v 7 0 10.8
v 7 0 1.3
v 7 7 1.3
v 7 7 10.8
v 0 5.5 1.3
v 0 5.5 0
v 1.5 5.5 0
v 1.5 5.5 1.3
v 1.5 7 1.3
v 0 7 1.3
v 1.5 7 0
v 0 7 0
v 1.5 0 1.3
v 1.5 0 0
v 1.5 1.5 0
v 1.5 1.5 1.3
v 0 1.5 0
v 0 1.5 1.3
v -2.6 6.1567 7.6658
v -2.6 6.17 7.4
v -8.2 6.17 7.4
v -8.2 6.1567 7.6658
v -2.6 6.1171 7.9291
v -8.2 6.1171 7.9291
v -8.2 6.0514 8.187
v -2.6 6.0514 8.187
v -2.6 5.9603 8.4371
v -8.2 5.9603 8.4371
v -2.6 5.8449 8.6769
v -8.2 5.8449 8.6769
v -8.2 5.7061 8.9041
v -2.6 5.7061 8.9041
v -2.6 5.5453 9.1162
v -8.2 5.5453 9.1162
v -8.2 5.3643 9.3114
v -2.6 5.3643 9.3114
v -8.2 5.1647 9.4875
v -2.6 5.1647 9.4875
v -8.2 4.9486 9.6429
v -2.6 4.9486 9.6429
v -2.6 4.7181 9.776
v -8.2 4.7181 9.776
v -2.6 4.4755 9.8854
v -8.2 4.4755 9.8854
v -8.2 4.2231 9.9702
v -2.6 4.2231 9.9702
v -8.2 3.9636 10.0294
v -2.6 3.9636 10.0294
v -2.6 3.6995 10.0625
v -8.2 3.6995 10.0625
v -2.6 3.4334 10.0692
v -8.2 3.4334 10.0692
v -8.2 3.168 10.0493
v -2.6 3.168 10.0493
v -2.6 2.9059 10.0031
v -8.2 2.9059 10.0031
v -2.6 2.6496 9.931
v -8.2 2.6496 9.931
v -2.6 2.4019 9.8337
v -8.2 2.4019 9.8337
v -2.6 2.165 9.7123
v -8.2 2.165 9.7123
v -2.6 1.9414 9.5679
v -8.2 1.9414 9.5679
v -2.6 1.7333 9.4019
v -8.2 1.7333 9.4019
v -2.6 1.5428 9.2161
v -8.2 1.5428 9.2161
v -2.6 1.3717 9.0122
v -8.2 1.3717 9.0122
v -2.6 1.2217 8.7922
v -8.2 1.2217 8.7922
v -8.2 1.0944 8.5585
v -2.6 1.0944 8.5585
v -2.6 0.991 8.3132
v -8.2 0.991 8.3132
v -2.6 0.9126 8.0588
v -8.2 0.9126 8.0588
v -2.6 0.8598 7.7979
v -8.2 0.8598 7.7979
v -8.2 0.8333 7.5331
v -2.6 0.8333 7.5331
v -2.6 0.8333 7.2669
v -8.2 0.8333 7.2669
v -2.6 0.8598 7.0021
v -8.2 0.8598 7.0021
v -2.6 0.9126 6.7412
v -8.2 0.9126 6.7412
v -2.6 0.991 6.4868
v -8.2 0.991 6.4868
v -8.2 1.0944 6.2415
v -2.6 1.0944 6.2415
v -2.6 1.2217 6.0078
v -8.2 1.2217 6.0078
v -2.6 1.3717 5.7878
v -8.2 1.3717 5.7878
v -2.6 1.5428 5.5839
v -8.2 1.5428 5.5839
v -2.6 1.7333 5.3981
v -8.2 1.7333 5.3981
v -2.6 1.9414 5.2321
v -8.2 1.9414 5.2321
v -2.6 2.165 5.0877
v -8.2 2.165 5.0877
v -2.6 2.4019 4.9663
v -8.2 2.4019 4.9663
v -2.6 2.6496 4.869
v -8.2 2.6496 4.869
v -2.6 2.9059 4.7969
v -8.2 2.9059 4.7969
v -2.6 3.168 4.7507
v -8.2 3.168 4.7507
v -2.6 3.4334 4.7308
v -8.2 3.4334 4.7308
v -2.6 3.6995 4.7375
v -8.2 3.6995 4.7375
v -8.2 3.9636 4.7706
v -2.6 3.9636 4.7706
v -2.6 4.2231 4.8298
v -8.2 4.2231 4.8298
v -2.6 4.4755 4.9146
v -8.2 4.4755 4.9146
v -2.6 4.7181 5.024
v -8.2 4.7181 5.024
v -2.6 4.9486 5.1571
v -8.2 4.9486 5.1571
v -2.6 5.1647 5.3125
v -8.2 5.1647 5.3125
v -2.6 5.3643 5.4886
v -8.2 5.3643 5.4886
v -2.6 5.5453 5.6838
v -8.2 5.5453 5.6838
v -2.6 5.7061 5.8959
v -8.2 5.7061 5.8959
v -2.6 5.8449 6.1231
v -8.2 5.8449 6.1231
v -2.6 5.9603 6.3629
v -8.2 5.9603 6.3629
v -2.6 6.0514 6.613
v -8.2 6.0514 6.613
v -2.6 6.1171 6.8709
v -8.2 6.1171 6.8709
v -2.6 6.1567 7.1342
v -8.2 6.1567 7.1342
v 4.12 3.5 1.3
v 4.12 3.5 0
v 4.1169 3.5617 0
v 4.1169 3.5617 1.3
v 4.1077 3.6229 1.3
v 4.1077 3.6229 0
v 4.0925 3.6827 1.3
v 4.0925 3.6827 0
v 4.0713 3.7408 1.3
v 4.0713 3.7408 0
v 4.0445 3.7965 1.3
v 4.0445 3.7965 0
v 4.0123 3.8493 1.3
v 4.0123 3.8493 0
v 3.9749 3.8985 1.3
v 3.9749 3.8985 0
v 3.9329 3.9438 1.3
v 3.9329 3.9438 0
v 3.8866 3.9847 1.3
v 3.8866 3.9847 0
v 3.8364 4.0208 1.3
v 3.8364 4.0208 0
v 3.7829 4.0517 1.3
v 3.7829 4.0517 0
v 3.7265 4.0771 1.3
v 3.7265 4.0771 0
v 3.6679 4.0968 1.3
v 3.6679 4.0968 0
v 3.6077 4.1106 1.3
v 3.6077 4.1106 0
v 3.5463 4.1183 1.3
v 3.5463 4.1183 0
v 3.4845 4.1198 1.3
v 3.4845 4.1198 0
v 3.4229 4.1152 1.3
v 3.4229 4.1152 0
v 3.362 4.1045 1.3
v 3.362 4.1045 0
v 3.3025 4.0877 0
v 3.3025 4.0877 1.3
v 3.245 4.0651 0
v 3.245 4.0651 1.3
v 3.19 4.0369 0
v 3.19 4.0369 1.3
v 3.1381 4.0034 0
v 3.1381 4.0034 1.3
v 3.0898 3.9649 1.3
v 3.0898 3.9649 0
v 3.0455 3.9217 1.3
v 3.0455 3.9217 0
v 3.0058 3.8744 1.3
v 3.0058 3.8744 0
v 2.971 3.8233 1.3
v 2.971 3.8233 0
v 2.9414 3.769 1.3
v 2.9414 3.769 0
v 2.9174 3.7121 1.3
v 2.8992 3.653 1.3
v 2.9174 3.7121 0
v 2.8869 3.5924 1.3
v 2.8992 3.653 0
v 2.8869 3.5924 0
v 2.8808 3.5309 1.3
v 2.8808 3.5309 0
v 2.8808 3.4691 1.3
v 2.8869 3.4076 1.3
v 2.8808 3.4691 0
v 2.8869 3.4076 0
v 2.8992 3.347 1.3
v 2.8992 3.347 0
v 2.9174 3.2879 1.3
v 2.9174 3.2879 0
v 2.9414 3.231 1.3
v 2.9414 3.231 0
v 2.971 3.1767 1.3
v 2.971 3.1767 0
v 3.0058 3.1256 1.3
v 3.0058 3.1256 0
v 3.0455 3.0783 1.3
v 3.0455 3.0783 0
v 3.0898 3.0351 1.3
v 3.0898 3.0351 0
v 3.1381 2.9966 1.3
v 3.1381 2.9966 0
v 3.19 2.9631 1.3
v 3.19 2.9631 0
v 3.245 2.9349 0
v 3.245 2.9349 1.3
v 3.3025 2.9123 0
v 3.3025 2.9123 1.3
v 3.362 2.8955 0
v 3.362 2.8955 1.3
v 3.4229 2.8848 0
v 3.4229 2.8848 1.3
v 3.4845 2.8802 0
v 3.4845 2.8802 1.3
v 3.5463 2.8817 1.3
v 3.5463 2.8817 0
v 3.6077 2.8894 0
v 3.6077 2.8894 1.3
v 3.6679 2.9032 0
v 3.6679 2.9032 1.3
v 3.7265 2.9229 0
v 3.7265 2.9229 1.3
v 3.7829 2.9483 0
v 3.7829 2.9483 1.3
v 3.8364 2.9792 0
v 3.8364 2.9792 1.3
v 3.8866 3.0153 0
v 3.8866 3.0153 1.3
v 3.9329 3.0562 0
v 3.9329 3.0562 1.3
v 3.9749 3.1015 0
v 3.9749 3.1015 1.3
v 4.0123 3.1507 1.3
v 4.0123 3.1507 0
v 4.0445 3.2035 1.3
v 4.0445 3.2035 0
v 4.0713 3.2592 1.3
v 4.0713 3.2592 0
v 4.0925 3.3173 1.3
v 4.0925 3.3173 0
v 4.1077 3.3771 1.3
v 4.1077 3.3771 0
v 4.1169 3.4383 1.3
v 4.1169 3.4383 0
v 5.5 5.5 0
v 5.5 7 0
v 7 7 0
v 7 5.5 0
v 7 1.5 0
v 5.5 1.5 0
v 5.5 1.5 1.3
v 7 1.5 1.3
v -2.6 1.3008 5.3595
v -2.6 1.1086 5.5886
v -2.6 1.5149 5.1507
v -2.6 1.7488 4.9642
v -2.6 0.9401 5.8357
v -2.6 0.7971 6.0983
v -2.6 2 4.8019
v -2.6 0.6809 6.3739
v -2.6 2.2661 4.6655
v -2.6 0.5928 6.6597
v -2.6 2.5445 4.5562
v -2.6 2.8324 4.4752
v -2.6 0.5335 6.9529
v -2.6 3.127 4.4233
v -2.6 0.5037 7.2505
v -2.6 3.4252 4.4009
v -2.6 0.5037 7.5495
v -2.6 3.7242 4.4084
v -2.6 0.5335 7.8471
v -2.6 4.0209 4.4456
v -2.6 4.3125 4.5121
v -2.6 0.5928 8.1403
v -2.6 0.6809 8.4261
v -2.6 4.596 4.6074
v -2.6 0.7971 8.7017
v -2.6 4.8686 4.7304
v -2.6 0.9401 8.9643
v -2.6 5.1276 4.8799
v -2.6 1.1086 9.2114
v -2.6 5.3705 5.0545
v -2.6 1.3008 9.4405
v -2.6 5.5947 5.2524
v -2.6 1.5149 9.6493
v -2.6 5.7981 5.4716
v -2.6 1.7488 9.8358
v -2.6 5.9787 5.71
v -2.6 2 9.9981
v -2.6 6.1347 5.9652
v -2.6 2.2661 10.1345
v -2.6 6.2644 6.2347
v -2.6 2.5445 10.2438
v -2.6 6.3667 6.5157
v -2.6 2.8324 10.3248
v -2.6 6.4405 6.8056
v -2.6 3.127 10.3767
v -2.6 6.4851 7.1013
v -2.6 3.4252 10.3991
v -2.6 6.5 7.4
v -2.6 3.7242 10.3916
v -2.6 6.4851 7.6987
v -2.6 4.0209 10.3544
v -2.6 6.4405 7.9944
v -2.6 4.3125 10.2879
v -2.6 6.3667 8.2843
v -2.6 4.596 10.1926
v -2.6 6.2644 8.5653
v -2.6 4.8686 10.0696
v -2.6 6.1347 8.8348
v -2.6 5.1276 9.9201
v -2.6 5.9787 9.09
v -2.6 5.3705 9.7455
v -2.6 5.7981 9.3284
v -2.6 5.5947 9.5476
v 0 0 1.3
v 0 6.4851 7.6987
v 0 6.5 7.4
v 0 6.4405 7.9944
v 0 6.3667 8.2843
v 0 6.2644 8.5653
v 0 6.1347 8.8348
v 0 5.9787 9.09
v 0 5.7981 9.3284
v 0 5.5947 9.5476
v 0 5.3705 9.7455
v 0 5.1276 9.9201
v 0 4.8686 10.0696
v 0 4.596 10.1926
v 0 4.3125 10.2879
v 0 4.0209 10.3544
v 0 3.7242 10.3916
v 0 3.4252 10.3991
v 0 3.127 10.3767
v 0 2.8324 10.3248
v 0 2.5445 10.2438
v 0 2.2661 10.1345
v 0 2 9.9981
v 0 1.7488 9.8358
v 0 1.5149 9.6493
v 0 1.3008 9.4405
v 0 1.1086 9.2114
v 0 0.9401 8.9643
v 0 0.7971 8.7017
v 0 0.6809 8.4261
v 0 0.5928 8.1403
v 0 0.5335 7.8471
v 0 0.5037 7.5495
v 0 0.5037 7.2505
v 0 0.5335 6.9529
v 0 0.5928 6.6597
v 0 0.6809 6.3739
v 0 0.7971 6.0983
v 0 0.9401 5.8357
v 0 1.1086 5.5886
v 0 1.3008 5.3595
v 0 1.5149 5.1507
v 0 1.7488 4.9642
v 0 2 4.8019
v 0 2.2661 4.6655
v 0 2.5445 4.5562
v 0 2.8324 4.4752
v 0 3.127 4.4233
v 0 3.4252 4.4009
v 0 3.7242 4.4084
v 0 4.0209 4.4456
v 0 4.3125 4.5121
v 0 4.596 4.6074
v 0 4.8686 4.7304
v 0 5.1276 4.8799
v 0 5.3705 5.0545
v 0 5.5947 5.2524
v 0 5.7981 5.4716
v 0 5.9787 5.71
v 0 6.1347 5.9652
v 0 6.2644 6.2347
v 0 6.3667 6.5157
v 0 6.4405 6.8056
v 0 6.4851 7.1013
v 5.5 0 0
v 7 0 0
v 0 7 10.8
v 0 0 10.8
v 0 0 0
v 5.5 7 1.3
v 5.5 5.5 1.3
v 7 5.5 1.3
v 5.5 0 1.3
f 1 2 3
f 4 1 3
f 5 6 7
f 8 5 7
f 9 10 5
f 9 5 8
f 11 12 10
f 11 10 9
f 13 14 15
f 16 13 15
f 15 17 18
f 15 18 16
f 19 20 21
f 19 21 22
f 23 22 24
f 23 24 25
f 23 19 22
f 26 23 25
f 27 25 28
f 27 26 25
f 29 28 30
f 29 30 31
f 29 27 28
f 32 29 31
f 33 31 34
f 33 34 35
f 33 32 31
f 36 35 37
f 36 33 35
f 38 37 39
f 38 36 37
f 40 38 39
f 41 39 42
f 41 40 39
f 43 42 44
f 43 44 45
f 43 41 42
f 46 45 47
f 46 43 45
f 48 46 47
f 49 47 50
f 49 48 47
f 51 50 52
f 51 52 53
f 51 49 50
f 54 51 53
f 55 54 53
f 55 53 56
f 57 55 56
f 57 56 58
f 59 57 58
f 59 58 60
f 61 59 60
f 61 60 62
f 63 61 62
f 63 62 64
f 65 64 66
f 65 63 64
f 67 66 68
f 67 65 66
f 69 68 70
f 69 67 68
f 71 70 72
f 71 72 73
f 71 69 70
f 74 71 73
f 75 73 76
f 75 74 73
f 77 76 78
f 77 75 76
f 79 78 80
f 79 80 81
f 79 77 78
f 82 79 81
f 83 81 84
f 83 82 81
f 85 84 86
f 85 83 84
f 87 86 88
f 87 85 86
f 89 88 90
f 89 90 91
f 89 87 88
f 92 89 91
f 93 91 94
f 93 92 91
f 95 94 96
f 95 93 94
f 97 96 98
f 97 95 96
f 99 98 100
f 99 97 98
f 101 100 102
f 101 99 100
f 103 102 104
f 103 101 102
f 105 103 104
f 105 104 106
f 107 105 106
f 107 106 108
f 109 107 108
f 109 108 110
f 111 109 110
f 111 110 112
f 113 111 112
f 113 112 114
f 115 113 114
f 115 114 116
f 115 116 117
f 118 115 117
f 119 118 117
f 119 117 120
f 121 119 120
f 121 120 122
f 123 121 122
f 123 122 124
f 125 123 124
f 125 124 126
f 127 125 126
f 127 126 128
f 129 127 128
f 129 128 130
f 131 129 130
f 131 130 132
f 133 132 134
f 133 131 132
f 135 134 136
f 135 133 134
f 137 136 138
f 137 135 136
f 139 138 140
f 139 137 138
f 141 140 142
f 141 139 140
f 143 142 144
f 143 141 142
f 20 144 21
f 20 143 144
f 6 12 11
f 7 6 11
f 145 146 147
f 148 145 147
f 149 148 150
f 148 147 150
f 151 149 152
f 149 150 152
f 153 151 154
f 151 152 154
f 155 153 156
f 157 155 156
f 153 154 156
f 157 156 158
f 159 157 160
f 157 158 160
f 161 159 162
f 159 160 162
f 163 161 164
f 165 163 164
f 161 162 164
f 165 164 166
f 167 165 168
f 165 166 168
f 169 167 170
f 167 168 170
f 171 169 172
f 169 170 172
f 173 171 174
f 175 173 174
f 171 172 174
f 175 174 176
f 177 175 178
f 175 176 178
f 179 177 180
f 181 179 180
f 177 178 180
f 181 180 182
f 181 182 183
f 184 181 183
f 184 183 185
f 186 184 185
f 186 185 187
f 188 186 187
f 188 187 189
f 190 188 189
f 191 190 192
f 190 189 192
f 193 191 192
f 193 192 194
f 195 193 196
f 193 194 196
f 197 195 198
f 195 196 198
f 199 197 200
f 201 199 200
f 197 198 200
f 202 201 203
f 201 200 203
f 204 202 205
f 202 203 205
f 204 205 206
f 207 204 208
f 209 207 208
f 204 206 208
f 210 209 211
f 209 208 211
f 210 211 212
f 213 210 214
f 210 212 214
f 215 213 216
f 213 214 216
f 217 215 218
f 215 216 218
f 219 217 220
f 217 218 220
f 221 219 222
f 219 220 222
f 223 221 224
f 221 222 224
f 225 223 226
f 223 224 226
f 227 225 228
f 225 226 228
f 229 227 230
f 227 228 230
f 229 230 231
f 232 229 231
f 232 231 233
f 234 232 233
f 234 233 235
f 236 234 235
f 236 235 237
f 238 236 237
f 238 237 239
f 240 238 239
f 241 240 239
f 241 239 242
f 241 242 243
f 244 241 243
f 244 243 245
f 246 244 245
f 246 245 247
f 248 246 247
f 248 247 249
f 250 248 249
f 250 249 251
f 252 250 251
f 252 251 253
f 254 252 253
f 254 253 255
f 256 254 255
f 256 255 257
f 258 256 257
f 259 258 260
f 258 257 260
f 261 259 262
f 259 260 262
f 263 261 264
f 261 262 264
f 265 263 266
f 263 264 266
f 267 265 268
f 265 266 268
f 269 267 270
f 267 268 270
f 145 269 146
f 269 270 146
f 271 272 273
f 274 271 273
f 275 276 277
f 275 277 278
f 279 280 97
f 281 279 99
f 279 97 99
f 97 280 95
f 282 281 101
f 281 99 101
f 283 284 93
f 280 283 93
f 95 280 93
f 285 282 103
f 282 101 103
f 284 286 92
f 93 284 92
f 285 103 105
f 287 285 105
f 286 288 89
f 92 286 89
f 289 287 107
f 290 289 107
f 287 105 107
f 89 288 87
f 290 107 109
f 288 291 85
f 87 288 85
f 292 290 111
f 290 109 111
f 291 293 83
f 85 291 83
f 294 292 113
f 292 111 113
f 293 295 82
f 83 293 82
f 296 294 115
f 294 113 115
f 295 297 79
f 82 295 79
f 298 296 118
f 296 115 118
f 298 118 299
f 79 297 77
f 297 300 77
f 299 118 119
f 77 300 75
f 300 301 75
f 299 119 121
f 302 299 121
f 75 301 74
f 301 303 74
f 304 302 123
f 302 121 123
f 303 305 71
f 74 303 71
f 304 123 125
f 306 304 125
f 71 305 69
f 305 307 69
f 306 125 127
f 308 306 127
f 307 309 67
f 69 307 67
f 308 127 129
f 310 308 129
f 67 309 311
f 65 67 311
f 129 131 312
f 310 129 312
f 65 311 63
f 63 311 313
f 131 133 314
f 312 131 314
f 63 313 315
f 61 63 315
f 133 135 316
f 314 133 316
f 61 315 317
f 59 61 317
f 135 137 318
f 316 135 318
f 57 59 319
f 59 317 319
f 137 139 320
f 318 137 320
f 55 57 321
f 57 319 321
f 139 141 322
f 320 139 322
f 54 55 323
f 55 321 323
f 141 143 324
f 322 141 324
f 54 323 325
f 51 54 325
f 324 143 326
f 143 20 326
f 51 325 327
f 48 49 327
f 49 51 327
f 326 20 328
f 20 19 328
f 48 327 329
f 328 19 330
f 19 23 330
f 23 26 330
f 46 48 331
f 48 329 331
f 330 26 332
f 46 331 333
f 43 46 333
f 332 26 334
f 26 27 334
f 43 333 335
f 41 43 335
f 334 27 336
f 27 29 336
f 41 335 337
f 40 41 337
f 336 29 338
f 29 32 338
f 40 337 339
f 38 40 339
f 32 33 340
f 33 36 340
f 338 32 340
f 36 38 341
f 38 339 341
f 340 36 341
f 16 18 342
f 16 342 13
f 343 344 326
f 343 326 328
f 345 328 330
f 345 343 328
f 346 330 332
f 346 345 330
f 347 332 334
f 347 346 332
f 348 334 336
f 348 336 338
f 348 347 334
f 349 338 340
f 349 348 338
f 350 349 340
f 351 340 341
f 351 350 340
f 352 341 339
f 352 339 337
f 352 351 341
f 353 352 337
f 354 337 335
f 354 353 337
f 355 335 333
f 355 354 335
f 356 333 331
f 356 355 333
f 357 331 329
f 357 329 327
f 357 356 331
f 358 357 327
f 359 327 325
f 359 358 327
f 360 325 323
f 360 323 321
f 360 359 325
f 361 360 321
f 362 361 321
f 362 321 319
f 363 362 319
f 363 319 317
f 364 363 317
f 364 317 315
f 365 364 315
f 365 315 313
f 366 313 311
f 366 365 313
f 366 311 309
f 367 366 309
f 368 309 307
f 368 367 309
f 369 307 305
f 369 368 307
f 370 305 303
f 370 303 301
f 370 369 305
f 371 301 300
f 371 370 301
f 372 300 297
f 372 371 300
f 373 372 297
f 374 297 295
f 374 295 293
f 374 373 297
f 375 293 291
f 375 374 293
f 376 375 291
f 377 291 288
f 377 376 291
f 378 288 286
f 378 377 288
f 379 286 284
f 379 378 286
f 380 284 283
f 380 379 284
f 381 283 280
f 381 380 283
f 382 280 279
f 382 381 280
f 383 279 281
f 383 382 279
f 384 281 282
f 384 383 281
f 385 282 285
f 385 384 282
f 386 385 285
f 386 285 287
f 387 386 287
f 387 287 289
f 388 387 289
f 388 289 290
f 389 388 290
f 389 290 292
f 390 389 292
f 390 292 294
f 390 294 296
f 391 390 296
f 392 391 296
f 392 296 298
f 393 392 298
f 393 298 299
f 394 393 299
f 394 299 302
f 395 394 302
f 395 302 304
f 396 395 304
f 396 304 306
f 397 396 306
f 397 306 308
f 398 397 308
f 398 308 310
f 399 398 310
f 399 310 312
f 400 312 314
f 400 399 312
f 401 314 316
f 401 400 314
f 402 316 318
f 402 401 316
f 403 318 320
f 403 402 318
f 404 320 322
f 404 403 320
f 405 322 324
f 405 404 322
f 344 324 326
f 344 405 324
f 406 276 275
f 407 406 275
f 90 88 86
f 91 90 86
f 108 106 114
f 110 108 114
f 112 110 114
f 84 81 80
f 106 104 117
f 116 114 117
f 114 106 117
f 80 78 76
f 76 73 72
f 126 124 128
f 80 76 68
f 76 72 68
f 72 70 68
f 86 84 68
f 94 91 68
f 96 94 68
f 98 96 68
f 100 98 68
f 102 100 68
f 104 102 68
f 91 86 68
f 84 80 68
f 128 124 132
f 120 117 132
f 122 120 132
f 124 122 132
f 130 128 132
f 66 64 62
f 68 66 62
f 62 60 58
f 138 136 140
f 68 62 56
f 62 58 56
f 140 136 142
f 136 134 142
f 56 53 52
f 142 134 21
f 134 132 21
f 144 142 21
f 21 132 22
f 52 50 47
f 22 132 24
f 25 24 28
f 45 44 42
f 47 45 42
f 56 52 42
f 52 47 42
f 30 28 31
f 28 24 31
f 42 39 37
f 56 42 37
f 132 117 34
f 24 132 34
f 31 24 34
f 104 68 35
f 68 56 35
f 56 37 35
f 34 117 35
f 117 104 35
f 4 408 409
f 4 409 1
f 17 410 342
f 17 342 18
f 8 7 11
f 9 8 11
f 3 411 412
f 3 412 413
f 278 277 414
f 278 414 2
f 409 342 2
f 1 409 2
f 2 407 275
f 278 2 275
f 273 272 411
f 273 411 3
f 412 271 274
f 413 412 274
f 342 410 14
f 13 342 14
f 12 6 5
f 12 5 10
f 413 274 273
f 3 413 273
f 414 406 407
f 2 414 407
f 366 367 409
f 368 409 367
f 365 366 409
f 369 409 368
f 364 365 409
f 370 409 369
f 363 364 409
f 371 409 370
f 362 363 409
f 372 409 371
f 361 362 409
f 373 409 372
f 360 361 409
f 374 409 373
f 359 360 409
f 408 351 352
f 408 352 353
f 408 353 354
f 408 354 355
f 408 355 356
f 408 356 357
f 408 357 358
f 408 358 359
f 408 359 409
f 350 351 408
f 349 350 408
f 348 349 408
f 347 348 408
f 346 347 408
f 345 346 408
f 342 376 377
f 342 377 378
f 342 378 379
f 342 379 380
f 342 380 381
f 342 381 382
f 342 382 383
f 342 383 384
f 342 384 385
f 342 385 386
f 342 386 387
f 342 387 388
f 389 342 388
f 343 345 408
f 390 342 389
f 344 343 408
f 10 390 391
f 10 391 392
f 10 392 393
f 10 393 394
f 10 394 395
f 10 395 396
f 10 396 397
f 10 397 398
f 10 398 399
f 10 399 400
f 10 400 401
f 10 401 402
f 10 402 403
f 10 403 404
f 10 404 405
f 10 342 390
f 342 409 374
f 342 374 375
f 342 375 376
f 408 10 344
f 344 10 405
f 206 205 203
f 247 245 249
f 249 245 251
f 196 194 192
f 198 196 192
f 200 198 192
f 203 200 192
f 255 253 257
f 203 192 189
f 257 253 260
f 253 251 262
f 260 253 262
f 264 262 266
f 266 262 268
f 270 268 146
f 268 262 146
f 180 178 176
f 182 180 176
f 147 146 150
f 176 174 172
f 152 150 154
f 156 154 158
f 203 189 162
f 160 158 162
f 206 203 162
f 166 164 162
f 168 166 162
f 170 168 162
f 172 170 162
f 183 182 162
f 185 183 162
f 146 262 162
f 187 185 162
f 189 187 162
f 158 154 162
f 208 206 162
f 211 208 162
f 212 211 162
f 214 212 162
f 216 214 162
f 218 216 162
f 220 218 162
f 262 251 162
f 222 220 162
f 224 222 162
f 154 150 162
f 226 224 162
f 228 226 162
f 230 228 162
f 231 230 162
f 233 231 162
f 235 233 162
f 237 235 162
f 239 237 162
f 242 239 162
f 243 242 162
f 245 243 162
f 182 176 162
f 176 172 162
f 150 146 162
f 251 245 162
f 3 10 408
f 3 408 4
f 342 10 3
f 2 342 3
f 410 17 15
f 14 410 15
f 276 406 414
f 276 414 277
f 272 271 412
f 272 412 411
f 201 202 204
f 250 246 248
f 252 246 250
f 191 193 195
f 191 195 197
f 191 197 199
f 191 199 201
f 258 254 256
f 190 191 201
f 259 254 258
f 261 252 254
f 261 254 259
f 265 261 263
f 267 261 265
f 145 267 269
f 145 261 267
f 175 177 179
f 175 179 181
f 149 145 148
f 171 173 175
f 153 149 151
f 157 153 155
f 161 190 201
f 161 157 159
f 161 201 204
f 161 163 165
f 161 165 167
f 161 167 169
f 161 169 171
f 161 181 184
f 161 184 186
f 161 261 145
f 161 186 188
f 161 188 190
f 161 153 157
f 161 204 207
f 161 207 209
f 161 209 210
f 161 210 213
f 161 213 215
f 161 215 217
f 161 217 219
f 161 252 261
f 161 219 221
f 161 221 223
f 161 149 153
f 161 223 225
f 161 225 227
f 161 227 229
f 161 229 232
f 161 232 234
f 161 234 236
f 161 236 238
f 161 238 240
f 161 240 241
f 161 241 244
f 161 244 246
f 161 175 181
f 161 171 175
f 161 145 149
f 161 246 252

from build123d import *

# Parameters (mm, degrees)
F0_W     = 1.5
F0_H     = 1.5
F0_R     = 0.62
F1_DEPTH = 1.3
F3_W     = 7
F3_H     = 7
F4_DEPTH = 9.5
F5_R     = 3
F6_DEPTH = 2.6
F8_R     = 2.67
F9_DEPTH = 5.6


with BuildPart() as f1:
    # F0 (on Top) → F1 (new body)
    with BuildSketch(Plane.XY):
        with Locations((0.75, 6.25)):
            Rectangle(F0_W, F0_H)
        with Locations((6.25, 6.25)):
            Rectangle(F0_W, F0_H)
        with Locations((6.25, 0.75)):
            Rectangle(F0_W, F0_H)
        with Locations((0.75, 0.75)):
            Rectangle(F0_W, F0_H)
        with Locations((3.5, 3.5)):
            Circle(F0_R)
    extrude(amount=F1_DEPTH)


with BuildPart() as f4:
    # F3 (on offset) → F4 (new body)
    with BuildSketch(Plane.XY.offset(1.3)):
        with Locations((3.5, 3.5)):
            Rectangle(F3_W, F3_H)
    extrude(amount=F4_DEPTH)

    # F5 (on Right) → F6 (join)
    with BuildSketch(Plane.YZ):
        with Locations((3.5, 7.4)):
            Circle(F5_R)
    extrude(amount=-F6_DEPTH)

    # F8 (on offset) → F9 (join)
    with BuildSketch(Plane.YZ.offset(-2.6)):
        with Locations((3.5, 7.4)):
            Circle(F8_R)
    extrude(amount=-F9_DEPTH)


solid = Compound([f1.part, f4.part])
